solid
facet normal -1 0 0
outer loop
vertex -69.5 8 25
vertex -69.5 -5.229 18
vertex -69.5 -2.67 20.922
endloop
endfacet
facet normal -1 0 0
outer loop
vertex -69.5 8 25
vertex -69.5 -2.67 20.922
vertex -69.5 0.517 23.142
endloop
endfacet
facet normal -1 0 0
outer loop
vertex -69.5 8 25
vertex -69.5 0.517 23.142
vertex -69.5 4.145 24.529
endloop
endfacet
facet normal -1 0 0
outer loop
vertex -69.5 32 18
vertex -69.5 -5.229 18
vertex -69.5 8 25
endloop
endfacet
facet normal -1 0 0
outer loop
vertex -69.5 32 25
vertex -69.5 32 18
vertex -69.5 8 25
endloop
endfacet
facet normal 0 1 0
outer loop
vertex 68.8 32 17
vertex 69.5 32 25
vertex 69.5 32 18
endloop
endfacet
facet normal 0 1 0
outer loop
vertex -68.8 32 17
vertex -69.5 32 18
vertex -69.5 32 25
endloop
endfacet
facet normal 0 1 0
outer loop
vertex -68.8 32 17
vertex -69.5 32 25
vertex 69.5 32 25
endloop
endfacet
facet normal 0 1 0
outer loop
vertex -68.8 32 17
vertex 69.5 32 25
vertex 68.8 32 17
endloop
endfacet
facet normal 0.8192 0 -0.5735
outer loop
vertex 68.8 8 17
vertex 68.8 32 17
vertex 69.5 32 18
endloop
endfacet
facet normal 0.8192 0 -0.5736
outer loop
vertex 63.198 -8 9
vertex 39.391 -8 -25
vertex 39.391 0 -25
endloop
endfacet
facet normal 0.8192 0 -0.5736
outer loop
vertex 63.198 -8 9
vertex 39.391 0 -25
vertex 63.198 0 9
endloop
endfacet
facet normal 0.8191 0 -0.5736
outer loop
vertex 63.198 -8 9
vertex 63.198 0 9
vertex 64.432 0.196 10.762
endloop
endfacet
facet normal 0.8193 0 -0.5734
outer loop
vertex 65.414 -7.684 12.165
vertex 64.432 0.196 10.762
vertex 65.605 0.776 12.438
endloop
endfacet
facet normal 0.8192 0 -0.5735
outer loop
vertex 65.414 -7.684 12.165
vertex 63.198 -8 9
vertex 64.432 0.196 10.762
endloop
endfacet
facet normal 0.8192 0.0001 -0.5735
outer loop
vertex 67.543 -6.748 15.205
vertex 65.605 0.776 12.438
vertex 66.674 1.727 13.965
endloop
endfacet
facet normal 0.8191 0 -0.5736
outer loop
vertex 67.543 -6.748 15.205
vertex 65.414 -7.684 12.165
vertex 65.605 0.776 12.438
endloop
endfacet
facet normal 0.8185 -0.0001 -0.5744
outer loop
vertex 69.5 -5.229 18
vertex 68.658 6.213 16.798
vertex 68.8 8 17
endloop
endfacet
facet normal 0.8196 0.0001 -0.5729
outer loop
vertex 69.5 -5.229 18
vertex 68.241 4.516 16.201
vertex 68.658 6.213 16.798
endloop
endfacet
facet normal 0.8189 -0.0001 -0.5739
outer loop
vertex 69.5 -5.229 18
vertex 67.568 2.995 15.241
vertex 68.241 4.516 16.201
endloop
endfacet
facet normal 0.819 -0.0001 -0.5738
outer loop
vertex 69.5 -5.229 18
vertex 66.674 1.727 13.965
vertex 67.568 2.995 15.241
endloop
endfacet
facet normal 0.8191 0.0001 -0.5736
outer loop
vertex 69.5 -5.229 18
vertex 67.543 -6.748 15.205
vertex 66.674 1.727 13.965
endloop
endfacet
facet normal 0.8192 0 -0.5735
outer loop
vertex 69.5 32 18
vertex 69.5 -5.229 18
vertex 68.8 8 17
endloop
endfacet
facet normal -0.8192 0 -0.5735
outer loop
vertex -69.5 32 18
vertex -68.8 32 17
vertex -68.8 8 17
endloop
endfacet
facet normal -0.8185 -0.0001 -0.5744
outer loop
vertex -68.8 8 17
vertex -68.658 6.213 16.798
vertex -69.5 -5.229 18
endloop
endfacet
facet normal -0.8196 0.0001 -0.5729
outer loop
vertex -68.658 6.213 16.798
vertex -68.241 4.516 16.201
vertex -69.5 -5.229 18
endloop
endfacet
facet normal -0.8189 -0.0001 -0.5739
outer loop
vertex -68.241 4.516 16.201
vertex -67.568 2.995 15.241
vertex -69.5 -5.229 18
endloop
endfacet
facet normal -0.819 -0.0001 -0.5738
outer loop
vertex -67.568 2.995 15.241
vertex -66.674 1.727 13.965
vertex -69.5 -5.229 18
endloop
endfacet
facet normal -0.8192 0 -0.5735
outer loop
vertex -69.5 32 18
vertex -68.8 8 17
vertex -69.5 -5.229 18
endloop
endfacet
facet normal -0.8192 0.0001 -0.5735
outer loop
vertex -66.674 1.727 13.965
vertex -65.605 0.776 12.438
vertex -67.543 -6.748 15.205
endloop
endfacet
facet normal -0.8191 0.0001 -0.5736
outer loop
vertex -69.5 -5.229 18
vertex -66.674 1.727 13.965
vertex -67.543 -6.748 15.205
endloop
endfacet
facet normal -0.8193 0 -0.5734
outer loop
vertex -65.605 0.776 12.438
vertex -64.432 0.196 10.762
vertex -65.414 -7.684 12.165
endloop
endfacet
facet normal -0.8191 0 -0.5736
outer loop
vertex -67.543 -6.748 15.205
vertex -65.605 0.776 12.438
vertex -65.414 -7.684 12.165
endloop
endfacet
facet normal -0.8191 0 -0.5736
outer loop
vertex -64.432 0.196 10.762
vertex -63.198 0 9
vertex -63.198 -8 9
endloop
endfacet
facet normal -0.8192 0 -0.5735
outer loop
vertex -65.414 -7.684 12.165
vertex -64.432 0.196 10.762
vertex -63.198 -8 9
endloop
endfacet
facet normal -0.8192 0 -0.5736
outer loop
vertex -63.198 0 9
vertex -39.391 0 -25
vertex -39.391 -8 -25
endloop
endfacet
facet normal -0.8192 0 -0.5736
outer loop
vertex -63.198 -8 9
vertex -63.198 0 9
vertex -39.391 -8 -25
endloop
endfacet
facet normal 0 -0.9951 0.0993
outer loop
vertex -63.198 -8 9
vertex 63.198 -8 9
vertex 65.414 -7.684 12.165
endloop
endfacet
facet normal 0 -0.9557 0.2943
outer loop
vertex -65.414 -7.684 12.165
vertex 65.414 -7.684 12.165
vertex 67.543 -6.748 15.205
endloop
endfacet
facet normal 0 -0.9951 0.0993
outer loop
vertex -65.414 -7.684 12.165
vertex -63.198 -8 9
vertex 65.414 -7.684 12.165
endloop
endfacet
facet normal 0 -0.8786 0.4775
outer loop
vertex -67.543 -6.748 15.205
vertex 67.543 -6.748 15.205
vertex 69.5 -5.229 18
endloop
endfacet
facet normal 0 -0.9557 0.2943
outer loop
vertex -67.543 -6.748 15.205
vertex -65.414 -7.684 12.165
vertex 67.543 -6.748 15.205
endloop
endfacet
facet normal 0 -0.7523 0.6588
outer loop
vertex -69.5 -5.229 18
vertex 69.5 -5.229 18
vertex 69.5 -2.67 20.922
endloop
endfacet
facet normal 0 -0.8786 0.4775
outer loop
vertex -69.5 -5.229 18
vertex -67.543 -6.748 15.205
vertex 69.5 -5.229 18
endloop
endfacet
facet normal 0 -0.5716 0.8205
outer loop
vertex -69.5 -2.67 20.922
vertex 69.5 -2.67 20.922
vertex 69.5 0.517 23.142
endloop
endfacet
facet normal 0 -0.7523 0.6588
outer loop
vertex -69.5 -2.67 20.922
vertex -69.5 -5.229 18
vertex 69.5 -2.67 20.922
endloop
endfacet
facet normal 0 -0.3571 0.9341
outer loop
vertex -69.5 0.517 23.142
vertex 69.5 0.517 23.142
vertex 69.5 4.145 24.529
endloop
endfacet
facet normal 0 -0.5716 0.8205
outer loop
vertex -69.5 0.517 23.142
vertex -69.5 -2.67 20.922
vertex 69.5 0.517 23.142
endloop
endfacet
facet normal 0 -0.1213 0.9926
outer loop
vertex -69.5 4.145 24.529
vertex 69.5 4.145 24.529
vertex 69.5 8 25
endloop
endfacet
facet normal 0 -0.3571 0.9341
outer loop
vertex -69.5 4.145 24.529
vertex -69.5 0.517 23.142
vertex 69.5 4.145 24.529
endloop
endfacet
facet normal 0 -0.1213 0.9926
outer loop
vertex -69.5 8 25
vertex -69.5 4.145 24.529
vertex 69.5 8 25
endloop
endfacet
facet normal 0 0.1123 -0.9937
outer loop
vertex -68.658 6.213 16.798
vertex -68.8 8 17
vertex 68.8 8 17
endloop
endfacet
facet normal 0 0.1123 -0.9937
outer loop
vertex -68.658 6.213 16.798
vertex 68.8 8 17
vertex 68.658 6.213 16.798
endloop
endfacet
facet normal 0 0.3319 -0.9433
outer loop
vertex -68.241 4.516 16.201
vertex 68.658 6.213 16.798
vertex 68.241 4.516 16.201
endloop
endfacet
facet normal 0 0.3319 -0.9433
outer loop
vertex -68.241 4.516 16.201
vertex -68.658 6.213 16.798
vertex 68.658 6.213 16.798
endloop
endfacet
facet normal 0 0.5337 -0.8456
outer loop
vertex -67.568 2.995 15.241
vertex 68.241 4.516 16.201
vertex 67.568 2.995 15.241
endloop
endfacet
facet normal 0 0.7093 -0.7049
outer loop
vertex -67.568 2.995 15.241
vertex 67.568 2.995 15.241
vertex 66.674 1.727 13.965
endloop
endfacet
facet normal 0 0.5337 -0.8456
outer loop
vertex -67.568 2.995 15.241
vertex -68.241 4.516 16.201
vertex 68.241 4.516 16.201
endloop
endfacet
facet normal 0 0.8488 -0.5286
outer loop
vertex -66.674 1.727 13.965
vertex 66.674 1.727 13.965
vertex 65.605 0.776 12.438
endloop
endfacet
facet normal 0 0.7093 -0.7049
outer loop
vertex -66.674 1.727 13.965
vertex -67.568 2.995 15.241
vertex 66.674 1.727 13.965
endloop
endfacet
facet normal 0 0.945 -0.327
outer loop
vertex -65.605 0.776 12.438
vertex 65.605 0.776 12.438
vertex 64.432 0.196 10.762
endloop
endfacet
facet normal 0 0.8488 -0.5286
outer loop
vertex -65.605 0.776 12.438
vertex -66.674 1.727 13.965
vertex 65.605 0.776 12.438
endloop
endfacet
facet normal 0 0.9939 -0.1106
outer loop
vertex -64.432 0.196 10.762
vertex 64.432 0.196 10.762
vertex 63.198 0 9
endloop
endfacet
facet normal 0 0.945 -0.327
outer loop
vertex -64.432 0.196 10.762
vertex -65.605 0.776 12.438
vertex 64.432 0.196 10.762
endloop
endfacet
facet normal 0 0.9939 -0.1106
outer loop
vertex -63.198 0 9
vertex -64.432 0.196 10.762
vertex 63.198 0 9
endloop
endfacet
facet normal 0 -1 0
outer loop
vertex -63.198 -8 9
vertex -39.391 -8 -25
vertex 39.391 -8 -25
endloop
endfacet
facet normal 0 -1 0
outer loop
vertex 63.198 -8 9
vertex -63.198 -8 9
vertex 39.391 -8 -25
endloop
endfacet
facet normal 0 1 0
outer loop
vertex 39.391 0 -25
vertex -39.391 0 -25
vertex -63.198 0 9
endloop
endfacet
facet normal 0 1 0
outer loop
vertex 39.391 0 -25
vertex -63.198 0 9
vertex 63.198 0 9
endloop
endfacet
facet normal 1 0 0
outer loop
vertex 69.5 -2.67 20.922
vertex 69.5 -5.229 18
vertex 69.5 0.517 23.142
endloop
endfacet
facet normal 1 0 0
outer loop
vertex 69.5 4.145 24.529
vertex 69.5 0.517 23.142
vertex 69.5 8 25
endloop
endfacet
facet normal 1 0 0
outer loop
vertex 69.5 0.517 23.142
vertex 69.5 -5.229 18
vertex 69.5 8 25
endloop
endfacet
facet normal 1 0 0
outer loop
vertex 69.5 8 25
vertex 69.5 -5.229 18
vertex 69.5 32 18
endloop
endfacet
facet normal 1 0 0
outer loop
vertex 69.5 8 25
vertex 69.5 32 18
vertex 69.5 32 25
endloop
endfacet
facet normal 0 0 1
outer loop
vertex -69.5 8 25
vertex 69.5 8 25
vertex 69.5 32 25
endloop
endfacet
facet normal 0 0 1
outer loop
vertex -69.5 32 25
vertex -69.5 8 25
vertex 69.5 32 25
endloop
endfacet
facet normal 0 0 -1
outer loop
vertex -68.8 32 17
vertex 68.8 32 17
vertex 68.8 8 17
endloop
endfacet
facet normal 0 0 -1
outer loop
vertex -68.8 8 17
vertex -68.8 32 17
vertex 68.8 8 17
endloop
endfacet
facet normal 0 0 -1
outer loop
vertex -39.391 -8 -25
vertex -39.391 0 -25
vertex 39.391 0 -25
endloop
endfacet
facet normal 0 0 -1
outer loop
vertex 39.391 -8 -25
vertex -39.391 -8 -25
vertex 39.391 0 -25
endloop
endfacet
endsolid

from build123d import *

# Parameters (mm, degrees)
SKETCH1_W                    = 139
SKETCH1_H                    = 50
BASE_FLANGE1_DEPTH           = 8
EDGE_FLANGE1_STRIP_W         = 48
EDGE_FLANGE1_STRIP_H         = 8
EDGE_FLANGE1_STRIP_CUT_DEPTH = 139
EDGE_FLANGE1_DEPTH           = 139
CHAMFER1_SIZE                = 43
CHAMFER1_SIZE2               = 30.108924143
MIRROR3_START                = 46.606691224
MIRROR3_OUTLINE_W            = 55
MIRROR3_OUTLINE_H            = 41
MIRROR3_DEPTH                = 24.663786763


# Read off the part's stored shape, not the designer's step: Mirror3
# Sheet-metal steps are written as plain solids
with BuildPart() as part:
    # Sketch1 → Base-Flange1 (new body)
    with BuildSketch(Plane(origin=(0, 0, 0), x_dir=(1, 0, 0), z_dir=(0, 1, 0))):
        Rectangle(SKETCH1_W, SKETCH1_H)
    extrude(amount=-BASE_FLANGE1_DEPTH)

    # Edge-Flange1 strip (across the edge) → Edge-Flange1 strip cut (cut)
    with BuildSketch(Plane(origin=(-69.5, 0, 25), x_dir=(0, 0, -1), z_dir=(1, 0, 0))):
        with Locations((-8, -4)):
            Rectangle(EDGE_FLANGE1_STRIP_W, EDGE_FLANGE1_STRIP_H)
    extrude(amount=EDGE_FLANGE1_STRIP_CUT_DEPTH, mode=Mode.SUBTRACT)

    # Edge-Flange1 section (across the edge) → Edge-Flange1 (add)
    with BuildSketch(Plane(origin=(-69.5, 0, 25), x_dir=(0, 0, -1), z_dir=(1, 0, 0))):
        with BuildLine():
            Line((0, 8), (0, 32))
            Line((0, 32), (8, 32))
            Line((8, 32), (8, 8))
            ThreePointArc((8, 8), (10.343145751, 2.343145751), (16, 0))
            Line((16, 0), (16, -8))
            ThreePointArc((16, -8), (4.686291501, -3.313708499), (0, 8))
        make_face()
    extrude(amount=EDGE_FLANGE1_DEPTH)

    # Chamfer1
    chamfer1_edges = [part.edges().sort_by_distance(p)[0] for p in [
        (-69.5, -4, -25),
    ]]
    chamfer1_side = [part.faces().sort_by_distance(p)[0] for p in [
        (-69.5, -0.640312424, -8),
    ]]
    chamfer(chamfer1_edges, length=CHAMFER1_SIZE, length2=CHAMFER1_SIZE2, reference=chamfer1_side[0])

    # Mirror3 outline → Mirror3 (cut)
    with BuildSketch(Plane(origin=(0, 0, 0), x_dir=(0.5735764363510512, 0, 0.8191520442889882), z_dir=(0.8191520442889882, 0, -0.5735764363510512)).offset(MIRROR3_START)):
        with Locations((28.5, -12.5)):
            Rectangle(MIRROR3_OUTLINE_W, MIRROR3_OUTLINE_H)
    extrude(amount=MIRROR3_DEPTH, mode=Mode.SUBTRACT)


solid = part.part
